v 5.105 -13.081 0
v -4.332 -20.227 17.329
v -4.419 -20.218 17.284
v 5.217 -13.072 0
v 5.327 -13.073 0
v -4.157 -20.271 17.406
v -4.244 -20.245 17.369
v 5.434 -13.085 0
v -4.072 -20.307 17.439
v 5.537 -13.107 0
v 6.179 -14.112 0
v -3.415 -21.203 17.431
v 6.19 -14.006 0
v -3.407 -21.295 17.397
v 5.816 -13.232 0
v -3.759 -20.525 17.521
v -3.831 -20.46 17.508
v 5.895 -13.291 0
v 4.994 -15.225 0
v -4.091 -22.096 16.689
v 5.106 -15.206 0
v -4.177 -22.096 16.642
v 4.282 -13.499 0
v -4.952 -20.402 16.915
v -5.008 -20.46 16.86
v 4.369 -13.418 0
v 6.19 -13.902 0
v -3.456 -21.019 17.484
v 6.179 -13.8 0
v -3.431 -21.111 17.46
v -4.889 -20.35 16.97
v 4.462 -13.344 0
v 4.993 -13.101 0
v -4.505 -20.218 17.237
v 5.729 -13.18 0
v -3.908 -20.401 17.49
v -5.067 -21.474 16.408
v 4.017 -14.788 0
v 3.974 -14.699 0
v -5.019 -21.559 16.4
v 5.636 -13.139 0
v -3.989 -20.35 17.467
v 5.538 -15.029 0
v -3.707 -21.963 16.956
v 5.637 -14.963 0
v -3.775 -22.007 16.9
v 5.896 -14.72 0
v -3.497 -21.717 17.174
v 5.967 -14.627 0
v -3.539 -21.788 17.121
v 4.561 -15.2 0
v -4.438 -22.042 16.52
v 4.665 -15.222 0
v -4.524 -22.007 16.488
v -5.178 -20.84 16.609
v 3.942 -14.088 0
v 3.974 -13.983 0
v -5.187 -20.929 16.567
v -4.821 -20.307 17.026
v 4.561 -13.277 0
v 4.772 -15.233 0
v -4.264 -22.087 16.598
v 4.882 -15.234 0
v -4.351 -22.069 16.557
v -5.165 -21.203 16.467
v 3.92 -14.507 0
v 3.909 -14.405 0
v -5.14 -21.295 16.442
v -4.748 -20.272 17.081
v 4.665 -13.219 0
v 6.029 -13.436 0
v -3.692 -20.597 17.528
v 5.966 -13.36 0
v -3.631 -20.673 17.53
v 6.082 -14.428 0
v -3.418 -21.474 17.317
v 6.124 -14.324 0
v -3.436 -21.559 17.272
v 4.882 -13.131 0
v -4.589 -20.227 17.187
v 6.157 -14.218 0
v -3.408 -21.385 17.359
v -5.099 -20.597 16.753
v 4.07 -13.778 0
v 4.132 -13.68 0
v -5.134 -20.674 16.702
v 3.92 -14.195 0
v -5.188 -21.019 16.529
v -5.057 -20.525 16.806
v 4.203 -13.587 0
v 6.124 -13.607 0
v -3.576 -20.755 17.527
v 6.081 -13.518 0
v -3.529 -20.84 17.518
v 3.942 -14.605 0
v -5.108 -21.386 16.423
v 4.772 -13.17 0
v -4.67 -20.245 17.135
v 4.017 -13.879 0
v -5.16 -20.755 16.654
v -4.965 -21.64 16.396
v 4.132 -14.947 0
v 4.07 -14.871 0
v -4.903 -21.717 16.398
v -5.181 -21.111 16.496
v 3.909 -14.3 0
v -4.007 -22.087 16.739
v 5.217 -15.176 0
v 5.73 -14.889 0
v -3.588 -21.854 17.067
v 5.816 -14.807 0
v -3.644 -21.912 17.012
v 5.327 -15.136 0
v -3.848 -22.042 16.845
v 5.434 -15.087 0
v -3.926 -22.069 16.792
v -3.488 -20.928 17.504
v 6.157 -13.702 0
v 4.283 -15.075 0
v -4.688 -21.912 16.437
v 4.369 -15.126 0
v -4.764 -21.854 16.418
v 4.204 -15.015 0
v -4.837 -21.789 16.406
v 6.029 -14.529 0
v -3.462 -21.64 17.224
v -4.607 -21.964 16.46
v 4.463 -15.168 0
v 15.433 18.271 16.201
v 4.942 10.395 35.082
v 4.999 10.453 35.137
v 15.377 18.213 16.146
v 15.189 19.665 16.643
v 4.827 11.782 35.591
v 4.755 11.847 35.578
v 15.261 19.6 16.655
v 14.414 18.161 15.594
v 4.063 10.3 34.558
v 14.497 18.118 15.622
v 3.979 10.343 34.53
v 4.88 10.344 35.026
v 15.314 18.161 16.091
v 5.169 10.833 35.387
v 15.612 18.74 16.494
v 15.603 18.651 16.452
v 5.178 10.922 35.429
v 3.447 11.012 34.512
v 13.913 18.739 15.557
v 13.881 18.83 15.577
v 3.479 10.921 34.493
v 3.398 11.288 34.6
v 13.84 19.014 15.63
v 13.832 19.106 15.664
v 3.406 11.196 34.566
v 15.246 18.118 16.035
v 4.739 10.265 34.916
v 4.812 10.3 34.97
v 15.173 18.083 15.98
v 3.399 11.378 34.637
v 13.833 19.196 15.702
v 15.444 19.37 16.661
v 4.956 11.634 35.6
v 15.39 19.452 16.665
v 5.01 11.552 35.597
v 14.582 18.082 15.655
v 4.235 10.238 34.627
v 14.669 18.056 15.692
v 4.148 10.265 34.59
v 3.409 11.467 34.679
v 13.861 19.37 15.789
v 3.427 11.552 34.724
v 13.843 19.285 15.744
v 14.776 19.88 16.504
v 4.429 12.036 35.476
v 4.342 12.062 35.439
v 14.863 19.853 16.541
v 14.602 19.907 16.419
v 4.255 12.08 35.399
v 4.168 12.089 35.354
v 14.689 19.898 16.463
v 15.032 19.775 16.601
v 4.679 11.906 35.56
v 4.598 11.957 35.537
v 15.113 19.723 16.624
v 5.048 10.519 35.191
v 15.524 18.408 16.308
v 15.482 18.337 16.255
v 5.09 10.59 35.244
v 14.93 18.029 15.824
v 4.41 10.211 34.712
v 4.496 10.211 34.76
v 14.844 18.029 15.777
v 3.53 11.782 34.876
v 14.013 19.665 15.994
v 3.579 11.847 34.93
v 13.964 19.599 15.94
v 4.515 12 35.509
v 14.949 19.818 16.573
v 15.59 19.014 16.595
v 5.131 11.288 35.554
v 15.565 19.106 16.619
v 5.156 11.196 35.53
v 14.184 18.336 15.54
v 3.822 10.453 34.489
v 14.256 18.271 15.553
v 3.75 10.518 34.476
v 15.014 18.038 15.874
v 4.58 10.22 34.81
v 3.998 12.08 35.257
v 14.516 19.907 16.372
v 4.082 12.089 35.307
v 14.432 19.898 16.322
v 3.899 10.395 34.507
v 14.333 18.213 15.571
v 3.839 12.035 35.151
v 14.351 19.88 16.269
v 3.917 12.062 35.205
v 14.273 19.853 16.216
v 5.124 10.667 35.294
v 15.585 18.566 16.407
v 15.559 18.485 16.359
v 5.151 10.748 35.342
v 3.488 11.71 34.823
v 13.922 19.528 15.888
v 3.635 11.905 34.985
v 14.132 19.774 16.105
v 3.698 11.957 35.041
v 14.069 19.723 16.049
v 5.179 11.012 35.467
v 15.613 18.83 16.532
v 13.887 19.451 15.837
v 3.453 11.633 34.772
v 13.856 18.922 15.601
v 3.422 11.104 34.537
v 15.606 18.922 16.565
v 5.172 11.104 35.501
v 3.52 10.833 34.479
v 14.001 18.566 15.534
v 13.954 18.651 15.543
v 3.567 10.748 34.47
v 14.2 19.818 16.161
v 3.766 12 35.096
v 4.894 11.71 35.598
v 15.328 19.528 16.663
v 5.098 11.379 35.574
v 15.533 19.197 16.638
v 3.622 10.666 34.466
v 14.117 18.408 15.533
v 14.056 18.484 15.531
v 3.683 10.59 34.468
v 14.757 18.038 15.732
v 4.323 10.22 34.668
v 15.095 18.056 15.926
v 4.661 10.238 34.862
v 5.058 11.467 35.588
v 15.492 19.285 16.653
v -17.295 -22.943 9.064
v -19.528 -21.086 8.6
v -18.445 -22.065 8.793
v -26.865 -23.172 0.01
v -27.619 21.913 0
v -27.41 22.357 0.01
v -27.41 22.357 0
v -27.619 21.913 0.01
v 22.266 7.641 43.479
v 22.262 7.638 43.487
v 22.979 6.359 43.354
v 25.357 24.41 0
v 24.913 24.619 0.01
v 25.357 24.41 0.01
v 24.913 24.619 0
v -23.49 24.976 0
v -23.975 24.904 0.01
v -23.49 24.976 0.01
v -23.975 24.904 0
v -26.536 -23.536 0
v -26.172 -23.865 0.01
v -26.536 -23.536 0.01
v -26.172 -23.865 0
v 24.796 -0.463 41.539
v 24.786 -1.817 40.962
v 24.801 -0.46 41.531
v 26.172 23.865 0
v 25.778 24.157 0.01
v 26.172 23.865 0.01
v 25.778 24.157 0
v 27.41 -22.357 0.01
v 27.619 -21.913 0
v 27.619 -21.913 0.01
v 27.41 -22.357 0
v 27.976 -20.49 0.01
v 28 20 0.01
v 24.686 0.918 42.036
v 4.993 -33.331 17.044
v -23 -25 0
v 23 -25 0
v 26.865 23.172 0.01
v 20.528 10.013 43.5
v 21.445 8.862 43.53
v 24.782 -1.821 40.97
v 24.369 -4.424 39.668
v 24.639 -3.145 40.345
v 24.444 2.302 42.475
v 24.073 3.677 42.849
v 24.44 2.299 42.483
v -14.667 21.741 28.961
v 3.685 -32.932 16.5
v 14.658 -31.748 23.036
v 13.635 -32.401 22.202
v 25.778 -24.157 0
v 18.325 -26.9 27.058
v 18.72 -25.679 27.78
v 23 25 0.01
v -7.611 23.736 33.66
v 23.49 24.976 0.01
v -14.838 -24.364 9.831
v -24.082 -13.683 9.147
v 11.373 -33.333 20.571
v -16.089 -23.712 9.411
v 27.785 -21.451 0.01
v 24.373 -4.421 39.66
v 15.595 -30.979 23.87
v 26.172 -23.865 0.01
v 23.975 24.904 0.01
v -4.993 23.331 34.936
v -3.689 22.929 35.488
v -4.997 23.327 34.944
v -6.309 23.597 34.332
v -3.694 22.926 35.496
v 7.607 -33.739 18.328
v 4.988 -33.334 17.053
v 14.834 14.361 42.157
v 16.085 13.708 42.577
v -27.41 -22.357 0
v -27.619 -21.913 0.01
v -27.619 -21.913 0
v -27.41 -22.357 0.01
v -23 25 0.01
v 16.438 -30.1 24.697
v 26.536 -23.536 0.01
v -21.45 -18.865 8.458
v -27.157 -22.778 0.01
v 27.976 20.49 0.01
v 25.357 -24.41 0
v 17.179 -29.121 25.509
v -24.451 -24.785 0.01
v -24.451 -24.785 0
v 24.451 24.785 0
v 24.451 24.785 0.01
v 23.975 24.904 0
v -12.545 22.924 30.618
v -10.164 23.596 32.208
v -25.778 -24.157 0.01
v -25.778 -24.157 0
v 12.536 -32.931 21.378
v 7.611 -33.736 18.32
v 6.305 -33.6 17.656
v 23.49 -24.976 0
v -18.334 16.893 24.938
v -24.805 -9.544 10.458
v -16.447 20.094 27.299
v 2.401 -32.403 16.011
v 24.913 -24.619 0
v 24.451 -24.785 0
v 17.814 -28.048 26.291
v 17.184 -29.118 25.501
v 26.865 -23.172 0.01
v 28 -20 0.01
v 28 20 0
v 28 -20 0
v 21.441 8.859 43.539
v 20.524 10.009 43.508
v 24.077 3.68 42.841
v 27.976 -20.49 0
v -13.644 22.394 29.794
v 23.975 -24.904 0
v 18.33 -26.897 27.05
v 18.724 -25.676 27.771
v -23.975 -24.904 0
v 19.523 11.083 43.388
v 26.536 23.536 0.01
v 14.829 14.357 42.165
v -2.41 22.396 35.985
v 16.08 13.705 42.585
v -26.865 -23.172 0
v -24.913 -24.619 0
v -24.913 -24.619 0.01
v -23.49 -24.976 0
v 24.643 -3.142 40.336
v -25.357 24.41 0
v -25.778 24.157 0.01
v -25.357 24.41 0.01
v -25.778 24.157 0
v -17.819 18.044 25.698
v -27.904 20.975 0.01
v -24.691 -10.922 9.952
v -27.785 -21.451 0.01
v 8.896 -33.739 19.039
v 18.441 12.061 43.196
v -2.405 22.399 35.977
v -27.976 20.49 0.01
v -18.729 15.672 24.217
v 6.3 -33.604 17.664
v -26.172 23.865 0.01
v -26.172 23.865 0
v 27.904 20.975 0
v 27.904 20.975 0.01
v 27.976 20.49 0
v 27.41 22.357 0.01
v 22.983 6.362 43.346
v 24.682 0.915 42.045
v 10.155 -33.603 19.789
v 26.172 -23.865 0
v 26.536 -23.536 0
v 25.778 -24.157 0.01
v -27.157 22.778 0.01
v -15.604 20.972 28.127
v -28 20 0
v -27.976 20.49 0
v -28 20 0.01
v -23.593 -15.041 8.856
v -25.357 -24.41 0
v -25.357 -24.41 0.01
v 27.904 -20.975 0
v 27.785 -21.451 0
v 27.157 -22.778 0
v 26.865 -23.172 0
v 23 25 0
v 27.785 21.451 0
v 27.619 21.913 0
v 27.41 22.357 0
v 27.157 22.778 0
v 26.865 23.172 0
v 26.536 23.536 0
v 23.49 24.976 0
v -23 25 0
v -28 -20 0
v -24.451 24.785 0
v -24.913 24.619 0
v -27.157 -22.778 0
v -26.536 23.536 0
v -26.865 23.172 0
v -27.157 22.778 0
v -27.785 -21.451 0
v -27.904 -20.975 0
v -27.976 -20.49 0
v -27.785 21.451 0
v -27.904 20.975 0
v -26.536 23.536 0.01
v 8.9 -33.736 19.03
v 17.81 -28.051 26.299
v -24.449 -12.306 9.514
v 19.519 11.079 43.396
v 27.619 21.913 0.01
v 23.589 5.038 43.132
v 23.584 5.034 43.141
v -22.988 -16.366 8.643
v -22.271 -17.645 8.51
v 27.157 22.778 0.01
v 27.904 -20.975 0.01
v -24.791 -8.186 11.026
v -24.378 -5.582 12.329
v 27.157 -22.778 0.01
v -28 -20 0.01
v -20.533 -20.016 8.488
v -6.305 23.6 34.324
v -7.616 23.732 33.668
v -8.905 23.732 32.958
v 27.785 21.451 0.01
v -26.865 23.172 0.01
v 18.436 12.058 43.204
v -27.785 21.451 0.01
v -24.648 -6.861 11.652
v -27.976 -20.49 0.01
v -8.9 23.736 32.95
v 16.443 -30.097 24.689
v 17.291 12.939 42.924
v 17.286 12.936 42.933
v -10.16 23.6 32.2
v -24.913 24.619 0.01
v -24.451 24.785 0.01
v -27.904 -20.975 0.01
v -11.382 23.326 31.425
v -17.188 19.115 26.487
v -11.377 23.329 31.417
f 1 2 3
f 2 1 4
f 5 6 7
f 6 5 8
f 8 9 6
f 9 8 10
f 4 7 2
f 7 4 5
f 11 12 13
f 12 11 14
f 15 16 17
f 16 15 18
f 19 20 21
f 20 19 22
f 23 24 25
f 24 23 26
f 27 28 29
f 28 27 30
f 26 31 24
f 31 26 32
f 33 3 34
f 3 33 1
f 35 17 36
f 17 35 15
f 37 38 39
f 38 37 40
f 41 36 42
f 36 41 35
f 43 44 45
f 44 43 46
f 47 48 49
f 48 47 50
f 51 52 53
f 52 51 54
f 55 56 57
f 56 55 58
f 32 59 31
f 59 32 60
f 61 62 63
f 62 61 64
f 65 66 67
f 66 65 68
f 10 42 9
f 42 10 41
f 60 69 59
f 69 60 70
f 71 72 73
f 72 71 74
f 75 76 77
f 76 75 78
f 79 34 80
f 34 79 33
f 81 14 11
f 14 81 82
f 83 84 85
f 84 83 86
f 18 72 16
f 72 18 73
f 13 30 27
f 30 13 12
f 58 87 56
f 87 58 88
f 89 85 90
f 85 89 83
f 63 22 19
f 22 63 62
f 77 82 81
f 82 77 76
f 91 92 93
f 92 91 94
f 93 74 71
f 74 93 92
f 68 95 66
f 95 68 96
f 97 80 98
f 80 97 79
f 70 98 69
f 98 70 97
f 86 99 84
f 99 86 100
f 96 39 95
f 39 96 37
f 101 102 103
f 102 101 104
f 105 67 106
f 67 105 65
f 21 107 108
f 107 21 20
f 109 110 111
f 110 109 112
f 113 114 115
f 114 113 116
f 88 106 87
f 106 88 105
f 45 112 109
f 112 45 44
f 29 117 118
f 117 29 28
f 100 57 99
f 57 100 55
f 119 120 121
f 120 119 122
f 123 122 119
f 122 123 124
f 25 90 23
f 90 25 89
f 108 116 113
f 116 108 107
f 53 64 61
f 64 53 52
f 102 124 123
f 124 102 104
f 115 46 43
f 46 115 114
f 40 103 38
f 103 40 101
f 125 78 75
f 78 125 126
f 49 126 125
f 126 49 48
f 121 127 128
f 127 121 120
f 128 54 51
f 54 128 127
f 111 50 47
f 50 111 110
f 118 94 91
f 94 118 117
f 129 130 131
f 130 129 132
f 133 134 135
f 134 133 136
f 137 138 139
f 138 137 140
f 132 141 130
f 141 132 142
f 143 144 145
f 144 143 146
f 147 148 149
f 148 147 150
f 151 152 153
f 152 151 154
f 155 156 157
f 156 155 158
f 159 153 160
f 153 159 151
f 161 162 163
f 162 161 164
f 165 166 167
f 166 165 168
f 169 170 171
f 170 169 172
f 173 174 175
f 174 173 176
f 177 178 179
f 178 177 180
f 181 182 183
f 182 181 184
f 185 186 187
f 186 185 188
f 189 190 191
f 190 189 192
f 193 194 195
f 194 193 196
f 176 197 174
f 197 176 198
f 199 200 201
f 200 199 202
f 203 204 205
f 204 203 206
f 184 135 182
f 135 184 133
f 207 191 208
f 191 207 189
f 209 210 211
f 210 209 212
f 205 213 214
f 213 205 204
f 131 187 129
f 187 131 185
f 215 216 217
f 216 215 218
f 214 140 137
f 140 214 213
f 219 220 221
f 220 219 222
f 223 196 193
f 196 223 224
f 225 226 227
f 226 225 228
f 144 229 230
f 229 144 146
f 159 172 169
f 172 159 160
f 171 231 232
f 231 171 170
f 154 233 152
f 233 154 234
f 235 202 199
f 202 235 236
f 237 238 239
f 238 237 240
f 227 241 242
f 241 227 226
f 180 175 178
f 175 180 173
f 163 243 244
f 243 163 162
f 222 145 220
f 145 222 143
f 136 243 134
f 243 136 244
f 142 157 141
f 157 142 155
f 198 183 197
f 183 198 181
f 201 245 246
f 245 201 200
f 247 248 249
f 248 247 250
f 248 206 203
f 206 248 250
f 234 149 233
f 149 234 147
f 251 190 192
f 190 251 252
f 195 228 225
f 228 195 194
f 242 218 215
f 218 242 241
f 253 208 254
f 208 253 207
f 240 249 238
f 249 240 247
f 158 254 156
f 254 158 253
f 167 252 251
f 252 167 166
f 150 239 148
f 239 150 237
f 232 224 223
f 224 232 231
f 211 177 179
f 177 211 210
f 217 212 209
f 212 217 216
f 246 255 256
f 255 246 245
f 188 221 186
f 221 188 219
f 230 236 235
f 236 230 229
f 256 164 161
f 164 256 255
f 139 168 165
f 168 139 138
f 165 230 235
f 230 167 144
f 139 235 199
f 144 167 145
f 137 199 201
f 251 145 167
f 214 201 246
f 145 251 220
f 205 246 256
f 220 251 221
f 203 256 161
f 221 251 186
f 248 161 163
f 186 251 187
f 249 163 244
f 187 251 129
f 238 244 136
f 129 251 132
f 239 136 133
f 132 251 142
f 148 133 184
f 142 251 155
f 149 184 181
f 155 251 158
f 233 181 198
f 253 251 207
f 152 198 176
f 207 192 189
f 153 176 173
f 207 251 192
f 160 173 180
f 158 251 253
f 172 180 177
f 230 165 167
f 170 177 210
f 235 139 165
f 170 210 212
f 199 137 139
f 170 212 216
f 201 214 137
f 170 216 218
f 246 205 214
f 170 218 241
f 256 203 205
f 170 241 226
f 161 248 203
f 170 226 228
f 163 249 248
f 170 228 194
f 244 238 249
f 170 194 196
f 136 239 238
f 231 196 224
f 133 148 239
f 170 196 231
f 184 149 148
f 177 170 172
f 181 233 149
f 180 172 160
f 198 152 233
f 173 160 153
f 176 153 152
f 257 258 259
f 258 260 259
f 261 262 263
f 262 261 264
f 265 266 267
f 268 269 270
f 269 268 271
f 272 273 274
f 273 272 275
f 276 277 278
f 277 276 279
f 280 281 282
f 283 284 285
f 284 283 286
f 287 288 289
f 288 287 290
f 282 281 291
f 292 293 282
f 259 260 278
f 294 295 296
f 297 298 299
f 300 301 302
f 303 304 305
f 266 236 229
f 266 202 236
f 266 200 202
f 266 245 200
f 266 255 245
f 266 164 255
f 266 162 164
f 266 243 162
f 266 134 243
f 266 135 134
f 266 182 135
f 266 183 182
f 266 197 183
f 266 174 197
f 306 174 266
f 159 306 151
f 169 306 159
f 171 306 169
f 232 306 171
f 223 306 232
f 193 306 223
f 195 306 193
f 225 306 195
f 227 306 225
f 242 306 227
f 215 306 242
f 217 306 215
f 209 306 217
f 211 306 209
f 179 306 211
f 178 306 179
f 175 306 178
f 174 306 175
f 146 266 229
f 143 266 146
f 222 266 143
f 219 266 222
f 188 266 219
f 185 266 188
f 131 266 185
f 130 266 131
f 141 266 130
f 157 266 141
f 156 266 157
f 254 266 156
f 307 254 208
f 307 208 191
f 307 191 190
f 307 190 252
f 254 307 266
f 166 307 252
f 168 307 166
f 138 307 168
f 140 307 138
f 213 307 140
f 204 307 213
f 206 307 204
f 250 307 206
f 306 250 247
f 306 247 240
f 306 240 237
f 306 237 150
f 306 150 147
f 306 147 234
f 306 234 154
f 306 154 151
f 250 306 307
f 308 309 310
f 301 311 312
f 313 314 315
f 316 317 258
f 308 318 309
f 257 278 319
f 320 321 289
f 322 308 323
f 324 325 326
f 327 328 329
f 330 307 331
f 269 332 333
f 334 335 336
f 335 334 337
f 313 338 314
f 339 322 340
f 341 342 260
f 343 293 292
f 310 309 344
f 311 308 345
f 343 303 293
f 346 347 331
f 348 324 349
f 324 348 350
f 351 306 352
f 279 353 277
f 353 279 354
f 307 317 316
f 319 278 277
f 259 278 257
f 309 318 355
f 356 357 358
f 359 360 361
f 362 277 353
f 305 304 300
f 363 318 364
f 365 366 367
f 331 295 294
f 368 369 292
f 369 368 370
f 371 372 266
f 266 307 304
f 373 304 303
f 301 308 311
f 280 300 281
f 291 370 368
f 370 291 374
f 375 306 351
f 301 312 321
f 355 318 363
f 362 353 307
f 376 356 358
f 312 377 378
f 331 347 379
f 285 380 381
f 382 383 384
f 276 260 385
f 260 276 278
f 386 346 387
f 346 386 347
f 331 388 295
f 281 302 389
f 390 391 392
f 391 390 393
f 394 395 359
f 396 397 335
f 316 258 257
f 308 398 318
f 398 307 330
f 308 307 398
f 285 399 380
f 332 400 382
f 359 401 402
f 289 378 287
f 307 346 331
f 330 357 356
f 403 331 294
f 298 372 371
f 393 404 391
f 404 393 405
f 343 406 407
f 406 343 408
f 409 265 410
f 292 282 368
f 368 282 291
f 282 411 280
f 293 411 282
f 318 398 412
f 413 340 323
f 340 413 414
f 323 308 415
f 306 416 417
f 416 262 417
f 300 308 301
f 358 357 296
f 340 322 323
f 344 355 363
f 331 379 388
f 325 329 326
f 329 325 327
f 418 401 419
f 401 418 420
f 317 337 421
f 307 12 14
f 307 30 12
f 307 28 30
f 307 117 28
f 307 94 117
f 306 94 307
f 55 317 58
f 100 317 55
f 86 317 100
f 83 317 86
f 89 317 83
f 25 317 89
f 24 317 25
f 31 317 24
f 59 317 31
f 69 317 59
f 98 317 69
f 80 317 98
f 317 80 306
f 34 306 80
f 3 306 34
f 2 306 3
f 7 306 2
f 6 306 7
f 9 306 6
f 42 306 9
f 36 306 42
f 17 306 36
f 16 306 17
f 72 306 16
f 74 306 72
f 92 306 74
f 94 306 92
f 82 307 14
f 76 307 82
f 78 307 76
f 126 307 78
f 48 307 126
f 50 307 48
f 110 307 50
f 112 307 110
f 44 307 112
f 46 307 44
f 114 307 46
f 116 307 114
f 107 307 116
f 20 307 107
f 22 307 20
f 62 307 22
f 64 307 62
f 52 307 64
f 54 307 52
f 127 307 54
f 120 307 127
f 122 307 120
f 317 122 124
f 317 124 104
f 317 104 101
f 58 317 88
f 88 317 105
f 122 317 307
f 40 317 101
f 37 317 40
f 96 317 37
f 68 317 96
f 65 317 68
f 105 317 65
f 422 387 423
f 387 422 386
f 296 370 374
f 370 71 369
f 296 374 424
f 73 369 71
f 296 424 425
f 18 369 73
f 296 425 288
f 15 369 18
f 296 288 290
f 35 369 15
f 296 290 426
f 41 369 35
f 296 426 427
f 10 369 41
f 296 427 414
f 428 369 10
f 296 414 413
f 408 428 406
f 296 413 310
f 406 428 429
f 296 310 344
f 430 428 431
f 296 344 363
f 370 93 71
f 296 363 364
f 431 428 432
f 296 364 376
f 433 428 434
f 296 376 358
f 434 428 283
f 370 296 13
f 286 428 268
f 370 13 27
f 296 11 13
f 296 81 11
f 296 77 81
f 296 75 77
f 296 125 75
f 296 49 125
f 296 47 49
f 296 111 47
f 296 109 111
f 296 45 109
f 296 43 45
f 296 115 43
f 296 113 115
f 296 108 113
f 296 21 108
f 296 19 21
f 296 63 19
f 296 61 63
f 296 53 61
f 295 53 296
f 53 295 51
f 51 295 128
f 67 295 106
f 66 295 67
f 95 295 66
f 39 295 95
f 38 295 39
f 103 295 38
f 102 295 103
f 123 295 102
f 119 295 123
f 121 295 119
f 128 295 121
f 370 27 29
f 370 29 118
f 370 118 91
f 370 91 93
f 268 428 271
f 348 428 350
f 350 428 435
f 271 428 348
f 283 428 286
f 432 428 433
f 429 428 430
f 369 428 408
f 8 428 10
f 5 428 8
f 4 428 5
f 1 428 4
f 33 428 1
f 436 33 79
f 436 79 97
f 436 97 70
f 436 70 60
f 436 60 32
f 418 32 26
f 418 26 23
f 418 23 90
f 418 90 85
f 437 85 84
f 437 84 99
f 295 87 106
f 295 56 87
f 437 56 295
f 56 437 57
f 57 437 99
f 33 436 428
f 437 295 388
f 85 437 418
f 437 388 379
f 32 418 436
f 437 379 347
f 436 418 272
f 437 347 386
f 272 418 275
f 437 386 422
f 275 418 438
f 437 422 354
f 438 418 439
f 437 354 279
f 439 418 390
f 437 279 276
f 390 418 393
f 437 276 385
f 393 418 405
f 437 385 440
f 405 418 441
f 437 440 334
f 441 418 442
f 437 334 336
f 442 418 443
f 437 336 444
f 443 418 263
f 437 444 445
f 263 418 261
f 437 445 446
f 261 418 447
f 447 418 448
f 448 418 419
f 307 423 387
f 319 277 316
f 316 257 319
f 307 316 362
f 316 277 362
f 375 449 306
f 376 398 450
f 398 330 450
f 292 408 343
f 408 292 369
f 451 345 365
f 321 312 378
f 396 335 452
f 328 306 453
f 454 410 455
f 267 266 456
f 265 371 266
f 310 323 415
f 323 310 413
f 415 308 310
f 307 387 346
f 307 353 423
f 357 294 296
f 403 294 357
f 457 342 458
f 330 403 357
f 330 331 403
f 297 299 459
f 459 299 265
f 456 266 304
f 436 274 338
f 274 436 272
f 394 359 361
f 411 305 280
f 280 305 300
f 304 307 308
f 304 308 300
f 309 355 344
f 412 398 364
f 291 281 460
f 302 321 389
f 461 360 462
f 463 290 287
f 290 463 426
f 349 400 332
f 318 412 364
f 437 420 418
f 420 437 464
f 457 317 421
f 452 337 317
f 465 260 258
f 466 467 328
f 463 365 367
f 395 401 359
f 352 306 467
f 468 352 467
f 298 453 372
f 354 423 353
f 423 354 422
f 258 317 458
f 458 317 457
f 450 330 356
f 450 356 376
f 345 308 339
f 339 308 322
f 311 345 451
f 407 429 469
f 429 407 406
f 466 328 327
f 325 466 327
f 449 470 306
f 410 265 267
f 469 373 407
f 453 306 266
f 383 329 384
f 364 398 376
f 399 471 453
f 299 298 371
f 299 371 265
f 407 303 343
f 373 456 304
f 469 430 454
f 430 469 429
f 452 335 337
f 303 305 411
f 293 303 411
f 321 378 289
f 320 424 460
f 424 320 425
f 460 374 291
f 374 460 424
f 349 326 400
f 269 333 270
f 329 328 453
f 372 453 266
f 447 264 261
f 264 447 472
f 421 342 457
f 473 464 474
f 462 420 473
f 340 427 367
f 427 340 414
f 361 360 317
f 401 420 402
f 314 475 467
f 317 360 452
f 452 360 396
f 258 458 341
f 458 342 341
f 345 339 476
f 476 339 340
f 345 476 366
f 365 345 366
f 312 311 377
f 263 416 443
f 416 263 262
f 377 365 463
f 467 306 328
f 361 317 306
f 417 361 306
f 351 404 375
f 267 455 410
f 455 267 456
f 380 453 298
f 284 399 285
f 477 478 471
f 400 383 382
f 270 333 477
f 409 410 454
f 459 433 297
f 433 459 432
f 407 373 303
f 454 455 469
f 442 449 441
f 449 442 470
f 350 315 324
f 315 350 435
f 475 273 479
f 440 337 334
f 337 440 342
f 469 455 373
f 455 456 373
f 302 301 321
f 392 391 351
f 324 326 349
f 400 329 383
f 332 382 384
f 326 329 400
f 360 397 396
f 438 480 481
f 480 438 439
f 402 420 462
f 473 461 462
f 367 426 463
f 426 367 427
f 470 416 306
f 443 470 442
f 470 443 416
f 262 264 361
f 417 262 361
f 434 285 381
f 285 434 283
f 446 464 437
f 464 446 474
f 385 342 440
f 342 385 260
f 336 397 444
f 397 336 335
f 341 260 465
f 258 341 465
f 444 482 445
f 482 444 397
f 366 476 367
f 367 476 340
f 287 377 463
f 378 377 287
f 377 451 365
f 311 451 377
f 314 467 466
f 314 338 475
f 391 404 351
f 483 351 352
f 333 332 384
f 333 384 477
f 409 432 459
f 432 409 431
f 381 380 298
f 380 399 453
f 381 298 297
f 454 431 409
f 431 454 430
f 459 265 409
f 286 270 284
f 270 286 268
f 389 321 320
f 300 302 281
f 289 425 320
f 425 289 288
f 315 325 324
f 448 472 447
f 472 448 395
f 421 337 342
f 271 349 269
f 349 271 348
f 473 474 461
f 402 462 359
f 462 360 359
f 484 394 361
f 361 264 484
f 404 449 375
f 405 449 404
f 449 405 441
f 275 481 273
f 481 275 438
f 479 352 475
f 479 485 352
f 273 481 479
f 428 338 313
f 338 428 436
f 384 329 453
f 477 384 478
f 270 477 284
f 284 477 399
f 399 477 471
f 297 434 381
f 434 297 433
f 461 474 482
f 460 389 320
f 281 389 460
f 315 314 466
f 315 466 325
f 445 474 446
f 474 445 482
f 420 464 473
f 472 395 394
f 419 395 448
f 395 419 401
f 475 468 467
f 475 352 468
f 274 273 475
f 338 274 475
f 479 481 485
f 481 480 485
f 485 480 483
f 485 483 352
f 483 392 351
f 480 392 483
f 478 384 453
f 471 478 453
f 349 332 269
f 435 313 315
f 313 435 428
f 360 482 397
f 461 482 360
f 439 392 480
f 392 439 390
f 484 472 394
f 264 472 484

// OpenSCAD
$fn=64;


// top surface
l1=55;
w1=50;
r1=15;

side_offset=0;
forward_offset=-5;

// Bootom surface
l2=56;
w2=50;
r2=5;

yaw=65;
pitch=-30;
roll=-18;

height=26;

hole_spacing = 38;
hole_diameter = 2;
hole_depth = 23;

eps=0.01;

module plate(l, w, r) {
  hull() {
    for(i =[-1, 1]) {
      for(j =[-1, 1]) {
        translate([i*(l/2-r), j*(w/2-r), 0]) cylinder(r=r, h=eps);
      }
    }
  }
}

module top_transform() {
  translate([side_offset, forward_offset, height-eps]) 
    rotate([0, 0, yaw]) 
    //translate([-offset, 0, 0]) 
    rotate([roll, 0, 0])
    rotate([0, pitch, 0]) 
    children();
}

module holes() {
  for(i=[0, 1]) {
    mirror([i, 0, 0]) 
      translate([-hole_spacing/2, 0, -hole_depth+2*eps]) 
      cylinder(d=hole_diameter, h=hole_depth+2*eps) ;
   
      // TODO: add chamfer at top of the hole 
  }
}

module main() {
  difference() {
    hull() {
      top_transform() plate(l1, w1, r1);
      plate(l2, w2, r2);
    }
    top_transform() holes();
  }
}

main();

//plate(l1, w1, r1);
//holes();
